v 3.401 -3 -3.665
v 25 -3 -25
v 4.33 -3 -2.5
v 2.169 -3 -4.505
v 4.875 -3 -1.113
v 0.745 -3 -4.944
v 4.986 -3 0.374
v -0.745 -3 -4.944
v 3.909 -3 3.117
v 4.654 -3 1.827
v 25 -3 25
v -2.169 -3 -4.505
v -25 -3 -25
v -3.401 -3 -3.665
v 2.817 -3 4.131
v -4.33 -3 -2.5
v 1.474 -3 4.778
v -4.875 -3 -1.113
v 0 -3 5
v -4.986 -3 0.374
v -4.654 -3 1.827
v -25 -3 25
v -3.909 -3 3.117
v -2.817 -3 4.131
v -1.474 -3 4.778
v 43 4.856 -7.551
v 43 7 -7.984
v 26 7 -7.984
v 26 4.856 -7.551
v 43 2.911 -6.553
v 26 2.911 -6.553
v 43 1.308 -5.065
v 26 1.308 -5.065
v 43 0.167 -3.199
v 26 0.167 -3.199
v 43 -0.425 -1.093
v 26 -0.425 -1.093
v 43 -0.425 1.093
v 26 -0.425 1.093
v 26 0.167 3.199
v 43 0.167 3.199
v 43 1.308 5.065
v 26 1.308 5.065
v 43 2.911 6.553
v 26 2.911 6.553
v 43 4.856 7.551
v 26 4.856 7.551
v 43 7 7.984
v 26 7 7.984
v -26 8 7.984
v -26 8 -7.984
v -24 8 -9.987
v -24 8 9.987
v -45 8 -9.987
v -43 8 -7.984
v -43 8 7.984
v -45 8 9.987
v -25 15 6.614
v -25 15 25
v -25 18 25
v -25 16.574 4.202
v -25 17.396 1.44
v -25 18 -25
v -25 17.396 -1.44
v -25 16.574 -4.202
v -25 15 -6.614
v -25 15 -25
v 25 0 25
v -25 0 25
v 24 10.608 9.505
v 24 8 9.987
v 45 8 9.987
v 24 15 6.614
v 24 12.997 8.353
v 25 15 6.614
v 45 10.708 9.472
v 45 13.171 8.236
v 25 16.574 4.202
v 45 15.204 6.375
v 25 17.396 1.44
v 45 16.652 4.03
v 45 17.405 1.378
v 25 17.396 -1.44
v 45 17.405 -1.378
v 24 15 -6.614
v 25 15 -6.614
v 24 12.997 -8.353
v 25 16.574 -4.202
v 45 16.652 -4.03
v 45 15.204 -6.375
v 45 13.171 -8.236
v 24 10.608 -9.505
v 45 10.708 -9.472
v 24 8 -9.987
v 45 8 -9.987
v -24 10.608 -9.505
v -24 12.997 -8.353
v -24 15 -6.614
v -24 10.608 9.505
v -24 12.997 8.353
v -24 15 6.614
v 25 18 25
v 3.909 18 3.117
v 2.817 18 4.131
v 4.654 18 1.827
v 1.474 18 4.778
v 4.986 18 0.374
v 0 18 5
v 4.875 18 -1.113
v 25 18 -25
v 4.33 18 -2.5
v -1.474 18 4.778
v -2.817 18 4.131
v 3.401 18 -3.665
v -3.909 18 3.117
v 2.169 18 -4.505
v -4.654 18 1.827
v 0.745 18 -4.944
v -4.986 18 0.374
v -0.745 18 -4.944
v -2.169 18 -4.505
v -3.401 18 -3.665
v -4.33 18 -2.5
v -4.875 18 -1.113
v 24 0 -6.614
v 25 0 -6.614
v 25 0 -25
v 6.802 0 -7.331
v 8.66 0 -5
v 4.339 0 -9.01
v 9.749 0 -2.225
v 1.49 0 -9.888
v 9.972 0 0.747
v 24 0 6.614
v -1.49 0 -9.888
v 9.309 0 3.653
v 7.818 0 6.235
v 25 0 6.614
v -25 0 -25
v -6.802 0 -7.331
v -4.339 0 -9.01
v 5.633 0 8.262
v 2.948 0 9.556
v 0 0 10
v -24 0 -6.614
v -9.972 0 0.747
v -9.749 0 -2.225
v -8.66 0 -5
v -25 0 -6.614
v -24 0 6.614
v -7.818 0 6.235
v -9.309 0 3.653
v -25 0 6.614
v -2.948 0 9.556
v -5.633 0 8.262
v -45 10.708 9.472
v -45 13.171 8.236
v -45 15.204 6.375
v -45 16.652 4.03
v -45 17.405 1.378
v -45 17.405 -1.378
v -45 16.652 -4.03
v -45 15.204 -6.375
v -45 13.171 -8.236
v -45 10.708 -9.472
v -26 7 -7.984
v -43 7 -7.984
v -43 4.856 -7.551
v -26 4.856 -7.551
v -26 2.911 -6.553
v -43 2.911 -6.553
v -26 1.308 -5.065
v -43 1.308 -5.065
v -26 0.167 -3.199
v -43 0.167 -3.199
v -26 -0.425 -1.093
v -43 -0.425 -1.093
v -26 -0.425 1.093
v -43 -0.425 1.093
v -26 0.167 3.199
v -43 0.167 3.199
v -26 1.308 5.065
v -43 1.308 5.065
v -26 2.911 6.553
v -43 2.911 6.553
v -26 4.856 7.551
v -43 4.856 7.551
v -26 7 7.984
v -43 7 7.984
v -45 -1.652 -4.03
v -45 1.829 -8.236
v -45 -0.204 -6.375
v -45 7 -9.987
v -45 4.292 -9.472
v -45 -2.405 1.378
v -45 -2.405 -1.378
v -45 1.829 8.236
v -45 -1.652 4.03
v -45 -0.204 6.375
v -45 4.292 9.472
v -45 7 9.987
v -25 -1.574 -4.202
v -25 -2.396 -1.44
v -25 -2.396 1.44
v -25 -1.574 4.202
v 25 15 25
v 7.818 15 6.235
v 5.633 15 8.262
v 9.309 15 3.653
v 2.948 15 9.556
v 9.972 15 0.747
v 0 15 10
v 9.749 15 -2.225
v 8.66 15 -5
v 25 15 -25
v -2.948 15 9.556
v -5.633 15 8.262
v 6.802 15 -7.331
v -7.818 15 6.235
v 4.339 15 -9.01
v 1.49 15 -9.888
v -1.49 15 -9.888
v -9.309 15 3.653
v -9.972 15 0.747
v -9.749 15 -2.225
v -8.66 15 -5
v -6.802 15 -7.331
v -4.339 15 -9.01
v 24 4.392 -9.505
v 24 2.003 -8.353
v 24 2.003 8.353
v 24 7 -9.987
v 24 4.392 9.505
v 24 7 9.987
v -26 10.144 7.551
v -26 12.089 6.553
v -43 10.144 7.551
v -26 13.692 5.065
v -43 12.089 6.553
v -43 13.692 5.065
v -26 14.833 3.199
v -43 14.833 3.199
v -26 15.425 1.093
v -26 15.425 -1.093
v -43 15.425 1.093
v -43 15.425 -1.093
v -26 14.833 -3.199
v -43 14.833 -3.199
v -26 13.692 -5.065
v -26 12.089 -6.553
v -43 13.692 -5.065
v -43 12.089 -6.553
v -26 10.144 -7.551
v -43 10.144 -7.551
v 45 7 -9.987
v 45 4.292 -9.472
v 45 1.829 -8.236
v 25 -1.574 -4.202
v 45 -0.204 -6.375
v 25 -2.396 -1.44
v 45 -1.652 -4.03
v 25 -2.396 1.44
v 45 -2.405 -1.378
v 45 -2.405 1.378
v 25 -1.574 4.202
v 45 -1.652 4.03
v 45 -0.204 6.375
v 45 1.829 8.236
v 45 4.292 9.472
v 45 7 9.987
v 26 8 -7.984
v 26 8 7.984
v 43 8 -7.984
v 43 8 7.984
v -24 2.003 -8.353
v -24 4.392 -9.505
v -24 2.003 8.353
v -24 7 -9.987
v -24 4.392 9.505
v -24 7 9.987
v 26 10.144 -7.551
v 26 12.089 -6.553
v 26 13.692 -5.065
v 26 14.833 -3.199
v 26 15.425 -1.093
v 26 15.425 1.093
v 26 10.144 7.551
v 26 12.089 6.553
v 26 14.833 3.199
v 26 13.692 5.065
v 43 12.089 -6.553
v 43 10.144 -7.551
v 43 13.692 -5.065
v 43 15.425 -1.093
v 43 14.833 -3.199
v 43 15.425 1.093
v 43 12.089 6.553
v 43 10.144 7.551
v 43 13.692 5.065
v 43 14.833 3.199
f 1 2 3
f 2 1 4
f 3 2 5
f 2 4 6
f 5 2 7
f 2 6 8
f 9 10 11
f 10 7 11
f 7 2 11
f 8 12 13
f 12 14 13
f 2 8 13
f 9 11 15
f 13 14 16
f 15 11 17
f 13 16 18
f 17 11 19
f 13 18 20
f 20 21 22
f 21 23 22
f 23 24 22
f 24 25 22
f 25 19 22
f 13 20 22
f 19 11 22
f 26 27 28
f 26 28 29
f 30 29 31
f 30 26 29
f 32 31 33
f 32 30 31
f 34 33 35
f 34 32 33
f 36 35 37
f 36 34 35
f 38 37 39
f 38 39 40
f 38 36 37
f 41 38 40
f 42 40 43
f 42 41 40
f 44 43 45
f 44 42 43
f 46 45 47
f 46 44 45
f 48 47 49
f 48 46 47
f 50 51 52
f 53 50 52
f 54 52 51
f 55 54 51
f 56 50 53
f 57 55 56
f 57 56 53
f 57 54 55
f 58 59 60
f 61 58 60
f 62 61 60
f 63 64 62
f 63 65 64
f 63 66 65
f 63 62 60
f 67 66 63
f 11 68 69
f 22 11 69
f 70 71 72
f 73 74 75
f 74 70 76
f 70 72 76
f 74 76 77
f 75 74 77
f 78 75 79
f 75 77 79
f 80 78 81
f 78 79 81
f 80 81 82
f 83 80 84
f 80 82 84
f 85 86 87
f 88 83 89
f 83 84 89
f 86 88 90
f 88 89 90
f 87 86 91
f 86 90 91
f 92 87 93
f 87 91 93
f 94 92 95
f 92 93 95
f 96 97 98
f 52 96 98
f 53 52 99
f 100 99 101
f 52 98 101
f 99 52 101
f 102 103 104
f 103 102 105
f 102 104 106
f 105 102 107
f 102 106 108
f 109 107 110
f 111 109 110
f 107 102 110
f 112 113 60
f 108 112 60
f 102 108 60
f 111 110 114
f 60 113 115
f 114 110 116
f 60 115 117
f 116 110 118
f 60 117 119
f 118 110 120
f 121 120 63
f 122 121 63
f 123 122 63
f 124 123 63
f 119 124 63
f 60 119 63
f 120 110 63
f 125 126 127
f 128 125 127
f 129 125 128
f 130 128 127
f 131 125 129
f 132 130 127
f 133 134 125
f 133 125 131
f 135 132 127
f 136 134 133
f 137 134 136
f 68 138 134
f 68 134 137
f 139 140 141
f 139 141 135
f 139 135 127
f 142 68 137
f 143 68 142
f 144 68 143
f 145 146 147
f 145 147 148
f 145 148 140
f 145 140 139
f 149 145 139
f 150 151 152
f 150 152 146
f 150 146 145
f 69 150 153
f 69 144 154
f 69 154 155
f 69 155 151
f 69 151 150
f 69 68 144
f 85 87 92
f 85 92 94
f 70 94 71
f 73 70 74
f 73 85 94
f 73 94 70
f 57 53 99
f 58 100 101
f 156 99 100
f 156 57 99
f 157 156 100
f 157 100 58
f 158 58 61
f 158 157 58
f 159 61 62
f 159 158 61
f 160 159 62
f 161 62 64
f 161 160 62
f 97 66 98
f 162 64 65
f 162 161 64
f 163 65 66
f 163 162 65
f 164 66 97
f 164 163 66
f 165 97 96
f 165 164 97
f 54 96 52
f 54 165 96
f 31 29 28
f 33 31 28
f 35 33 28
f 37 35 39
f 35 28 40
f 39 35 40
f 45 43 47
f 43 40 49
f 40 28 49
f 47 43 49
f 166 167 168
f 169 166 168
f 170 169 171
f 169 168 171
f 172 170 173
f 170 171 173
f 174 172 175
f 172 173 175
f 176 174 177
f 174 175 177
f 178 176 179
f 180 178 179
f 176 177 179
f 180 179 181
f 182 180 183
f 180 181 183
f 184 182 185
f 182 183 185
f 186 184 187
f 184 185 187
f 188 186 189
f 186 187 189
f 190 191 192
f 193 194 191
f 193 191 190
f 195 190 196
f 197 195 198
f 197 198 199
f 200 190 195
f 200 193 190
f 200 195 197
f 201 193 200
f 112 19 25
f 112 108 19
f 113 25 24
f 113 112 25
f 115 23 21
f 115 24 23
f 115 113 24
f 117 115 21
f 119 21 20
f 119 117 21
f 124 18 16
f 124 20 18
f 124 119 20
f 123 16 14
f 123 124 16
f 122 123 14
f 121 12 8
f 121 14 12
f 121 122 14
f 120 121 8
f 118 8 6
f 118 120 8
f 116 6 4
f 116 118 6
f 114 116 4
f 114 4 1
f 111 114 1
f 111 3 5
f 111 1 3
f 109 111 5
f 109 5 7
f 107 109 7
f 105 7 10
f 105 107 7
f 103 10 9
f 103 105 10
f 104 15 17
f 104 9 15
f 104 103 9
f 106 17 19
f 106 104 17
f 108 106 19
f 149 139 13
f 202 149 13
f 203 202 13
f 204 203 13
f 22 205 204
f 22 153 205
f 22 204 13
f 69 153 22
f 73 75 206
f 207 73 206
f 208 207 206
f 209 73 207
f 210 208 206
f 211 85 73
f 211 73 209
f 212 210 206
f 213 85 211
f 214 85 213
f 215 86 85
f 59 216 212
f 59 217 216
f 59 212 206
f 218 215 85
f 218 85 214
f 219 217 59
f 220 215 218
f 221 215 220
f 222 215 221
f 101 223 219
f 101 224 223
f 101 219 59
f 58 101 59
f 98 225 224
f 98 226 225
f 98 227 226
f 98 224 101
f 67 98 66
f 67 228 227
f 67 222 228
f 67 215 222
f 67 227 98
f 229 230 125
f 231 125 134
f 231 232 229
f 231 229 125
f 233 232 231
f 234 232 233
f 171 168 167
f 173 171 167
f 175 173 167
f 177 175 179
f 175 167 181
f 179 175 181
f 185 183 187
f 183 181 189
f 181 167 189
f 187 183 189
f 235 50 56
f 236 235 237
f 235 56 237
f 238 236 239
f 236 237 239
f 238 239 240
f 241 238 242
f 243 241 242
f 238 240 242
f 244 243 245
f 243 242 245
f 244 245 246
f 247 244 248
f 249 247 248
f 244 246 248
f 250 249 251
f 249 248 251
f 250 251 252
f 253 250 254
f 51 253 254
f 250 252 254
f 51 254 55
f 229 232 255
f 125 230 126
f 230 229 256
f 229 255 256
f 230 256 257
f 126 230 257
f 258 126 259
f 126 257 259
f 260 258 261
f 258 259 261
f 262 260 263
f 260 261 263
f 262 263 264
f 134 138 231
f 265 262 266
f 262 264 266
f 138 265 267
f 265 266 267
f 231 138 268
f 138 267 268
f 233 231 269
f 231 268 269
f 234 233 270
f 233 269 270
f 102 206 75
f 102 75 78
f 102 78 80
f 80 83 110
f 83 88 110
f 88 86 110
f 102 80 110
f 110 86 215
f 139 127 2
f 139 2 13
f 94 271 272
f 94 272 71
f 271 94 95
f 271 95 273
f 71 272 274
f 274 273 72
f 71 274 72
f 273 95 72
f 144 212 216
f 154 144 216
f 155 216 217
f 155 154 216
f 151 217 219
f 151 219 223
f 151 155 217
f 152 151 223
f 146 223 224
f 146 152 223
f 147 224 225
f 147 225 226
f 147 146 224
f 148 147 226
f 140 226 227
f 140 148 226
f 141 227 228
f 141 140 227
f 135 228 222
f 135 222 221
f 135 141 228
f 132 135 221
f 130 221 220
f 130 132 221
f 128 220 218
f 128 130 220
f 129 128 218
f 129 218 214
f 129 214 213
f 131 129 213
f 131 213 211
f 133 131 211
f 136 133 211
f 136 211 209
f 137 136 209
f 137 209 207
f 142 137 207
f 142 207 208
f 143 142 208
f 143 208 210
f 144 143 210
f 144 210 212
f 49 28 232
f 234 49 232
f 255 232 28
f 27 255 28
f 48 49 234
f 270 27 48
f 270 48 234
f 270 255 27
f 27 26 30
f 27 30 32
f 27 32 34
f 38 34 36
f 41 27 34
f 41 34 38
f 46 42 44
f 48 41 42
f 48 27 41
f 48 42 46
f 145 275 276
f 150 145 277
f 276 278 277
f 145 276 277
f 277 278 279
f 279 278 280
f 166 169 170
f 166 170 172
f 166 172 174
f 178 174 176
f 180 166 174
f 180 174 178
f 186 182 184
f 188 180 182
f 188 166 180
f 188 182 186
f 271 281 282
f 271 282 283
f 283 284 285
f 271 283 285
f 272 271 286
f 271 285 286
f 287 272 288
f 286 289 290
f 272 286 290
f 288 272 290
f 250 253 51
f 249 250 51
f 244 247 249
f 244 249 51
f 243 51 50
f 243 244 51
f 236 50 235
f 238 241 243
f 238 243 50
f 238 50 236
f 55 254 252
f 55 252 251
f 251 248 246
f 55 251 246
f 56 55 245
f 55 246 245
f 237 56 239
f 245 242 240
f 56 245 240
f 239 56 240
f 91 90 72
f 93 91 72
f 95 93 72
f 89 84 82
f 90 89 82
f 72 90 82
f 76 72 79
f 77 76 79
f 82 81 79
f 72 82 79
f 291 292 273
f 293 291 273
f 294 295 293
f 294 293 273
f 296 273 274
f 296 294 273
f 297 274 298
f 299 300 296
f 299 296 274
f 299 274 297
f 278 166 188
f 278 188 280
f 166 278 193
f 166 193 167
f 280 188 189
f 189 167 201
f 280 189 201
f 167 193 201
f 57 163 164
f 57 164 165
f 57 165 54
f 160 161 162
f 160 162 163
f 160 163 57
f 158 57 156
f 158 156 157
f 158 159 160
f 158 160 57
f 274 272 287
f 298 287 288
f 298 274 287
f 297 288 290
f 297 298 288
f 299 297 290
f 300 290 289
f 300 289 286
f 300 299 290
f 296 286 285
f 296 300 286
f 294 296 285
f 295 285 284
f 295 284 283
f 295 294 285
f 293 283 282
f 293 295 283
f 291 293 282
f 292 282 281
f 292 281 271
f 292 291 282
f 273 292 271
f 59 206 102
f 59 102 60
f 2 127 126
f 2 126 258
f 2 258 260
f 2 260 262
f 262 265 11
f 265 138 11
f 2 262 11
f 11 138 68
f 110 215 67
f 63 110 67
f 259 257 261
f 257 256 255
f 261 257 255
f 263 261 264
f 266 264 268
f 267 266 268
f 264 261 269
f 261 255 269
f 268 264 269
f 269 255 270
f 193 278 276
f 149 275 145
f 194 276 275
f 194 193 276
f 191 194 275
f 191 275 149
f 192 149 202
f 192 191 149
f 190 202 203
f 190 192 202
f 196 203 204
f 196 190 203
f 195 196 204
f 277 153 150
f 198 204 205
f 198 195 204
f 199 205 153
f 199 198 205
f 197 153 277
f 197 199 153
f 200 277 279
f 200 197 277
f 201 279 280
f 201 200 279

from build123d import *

# Parameters (mm, degrees)
SKETCH1_R                = 10
BOSS_EXTRUDE1_DEPTH      = 15
SKETCH3_W                = 50
SKETCH3_H                = 50
BOSS_EXTRUDE2_DEPTH      = 3
SKETCH5_W                = 50
SKETCH5_H                = 50
BOSS_EXTRUDE4_DEPTH      = 3
SKETCH7_R                = 10
BOSS_EXTRUDE5_DEPTH      = 20
BOSS_EXTRUDE5_DEPTH_BACK = 1
SKETCH8_R                = 10
BOSS_EXTRUDE6_DEPTH      = 20
BOSS_EXTRUDE6_DEPTH_BACK = 1
SKETCH9_W                = 28.965508976
SKETCH9_H                = 1
CUT_EXTRUDE2_DEPTH       = 21
SKETCH10_W               = 34.685430092
SKETCH10_H               = 1
CUT_EXTRUDE3_DEPTH       = 21
SKETCH6_R                = 5
CUT_EXTRUDE4_DEPTH       = 56.596762496
CUT_EXTRUDE5_START       = -2
SKETCH11_R               = 8
CUT_EXTRUDE5_DEPTH       = 17


with BuildPart() as part:
    # Sketch1 → Boss-Extrude1 (new body)
    with BuildSketch(Plane(origin=(0, 0, 0), x_dir=(1, 0, 0), z_dir=(0, 1, 0))):
        with Locations(Location((0, 0, 0), (0, 0, 270))):
            Circle(SKETCH1_R)
    extrude(amount=BOSS_EXTRUDE1_DEPTH)

    # Sketch3 → Boss-Extrude2 (add)
    with BuildSketch(Plane.XZ):
        Rectangle(SKETCH3_W, SKETCH3_H)
    extrude(amount=BOSS_EXTRUDE2_DEPTH)

    # Sketch5 → Boss-Extrude4 (add)
    with BuildSketch(Plane(origin=(0, 15, 0), x_dir=(1, 0, 0), z_dir=(0, 1, 0))):
        Rectangle(SKETCH5_W, SKETCH5_H)
    extrude(amount=BOSS_EXTRUDE4_DEPTH)

    # Sketch7 → Boss-Extrude5 (add, two sides)
    with BuildSketch(Plane.ZY.offset(25)) as boss_extrude5_sk:
        with Locations((0, 7.5)):
            Circle(SKETCH7_R)
    extrude(amount=BOSS_EXTRUDE5_DEPTH)
    extrude(boss_extrude5_sk.sketch, amount=-BOSS_EXTRUDE5_DEPTH_BACK)

    # Sketch8 → Boss-Extrude6 (add, two sides)
    with BuildSketch(Plane(origin=(25, 0, 0), x_dir=(0, 0, -1), z_dir=(1, 0, 0))) as boss_extrude6_sk:
        with Locations(Location((0, 7.5, 0), (0, 0, 180))):
            Circle(SKETCH8_R)
    extrude(amount=BOSS_EXTRUDE6_DEPTH)
    extrude(boss_extrude6_sk.sketch, amount=-BOSS_EXTRUDE6_DEPTH_BACK)

    # Sketch9 → Cut-Extrude2 (cut)
    with BuildSketch(Plane.ZY.offset(45)):
        with Locations((0, 7.5)):
            Rectangle(SKETCH9_W, SKETCH9_H)
    extrude(amount=-CUT_EXTRUDE2_DEPTH, mode=Mode.SUBTRACT)

    # Sketch10 → Cut-Extrude3 (cut)
    with BuildSketch(Plane(origin=(45, 0, 0), x_dir=(0, 0, -1), z_dir=(1, 0, 0))):
        with Locations((0, 7.5)):
            Rectangle(SKETCH10_W, SKETCH10_H)
    extrude(amount=-CUT_EXTRUDE3_DEPTH, mode=Mode.SUBTRACT)

    # Sketch6 → Cut-Extrude4 (cut, through all)
    with BuildSketch(Plane(origin=(0, 18, 0), x_dir=(1, 0, 0), z_dir=(0, 1, 0))):
        with Locations(Location((0, 0, 0), (0, 0, 270))):
            Circle(SKETCH6_R)
    extrude(amount=-CUT_EXTRUDE4_DEPTH, mode=Mode.SUBTRACT)

    # Sketch11 → Cut-Extrude5 (cut)
    with BuildSketch(Plane.ZY.offset(45).offset(CUT_EXTRUDE5_START)):
        with Locations((0, 7.5)):
            Circle(SKETCH11_R)
    extrude(amount=-CUT_EXTRUDE5_DEPTH, mode=Mode.SUBTRACT)

    # SurfaceCut1
    split(bisect_by=Plane(origin=(0, 0, 0), x_dir=(0, 0, -1), z_dir=(1, 0, 0)), keep=Keep.BOTTOM)

    # Mirror2: part across plane


with BuildPart() as part_1:
    add(part.part)
    add(part.part.mirror(Plane(origin=(0, 0, 0), x_dir=(0, 0, 1), z_dir=(1, 0, 0))))


solid = part_1.part
